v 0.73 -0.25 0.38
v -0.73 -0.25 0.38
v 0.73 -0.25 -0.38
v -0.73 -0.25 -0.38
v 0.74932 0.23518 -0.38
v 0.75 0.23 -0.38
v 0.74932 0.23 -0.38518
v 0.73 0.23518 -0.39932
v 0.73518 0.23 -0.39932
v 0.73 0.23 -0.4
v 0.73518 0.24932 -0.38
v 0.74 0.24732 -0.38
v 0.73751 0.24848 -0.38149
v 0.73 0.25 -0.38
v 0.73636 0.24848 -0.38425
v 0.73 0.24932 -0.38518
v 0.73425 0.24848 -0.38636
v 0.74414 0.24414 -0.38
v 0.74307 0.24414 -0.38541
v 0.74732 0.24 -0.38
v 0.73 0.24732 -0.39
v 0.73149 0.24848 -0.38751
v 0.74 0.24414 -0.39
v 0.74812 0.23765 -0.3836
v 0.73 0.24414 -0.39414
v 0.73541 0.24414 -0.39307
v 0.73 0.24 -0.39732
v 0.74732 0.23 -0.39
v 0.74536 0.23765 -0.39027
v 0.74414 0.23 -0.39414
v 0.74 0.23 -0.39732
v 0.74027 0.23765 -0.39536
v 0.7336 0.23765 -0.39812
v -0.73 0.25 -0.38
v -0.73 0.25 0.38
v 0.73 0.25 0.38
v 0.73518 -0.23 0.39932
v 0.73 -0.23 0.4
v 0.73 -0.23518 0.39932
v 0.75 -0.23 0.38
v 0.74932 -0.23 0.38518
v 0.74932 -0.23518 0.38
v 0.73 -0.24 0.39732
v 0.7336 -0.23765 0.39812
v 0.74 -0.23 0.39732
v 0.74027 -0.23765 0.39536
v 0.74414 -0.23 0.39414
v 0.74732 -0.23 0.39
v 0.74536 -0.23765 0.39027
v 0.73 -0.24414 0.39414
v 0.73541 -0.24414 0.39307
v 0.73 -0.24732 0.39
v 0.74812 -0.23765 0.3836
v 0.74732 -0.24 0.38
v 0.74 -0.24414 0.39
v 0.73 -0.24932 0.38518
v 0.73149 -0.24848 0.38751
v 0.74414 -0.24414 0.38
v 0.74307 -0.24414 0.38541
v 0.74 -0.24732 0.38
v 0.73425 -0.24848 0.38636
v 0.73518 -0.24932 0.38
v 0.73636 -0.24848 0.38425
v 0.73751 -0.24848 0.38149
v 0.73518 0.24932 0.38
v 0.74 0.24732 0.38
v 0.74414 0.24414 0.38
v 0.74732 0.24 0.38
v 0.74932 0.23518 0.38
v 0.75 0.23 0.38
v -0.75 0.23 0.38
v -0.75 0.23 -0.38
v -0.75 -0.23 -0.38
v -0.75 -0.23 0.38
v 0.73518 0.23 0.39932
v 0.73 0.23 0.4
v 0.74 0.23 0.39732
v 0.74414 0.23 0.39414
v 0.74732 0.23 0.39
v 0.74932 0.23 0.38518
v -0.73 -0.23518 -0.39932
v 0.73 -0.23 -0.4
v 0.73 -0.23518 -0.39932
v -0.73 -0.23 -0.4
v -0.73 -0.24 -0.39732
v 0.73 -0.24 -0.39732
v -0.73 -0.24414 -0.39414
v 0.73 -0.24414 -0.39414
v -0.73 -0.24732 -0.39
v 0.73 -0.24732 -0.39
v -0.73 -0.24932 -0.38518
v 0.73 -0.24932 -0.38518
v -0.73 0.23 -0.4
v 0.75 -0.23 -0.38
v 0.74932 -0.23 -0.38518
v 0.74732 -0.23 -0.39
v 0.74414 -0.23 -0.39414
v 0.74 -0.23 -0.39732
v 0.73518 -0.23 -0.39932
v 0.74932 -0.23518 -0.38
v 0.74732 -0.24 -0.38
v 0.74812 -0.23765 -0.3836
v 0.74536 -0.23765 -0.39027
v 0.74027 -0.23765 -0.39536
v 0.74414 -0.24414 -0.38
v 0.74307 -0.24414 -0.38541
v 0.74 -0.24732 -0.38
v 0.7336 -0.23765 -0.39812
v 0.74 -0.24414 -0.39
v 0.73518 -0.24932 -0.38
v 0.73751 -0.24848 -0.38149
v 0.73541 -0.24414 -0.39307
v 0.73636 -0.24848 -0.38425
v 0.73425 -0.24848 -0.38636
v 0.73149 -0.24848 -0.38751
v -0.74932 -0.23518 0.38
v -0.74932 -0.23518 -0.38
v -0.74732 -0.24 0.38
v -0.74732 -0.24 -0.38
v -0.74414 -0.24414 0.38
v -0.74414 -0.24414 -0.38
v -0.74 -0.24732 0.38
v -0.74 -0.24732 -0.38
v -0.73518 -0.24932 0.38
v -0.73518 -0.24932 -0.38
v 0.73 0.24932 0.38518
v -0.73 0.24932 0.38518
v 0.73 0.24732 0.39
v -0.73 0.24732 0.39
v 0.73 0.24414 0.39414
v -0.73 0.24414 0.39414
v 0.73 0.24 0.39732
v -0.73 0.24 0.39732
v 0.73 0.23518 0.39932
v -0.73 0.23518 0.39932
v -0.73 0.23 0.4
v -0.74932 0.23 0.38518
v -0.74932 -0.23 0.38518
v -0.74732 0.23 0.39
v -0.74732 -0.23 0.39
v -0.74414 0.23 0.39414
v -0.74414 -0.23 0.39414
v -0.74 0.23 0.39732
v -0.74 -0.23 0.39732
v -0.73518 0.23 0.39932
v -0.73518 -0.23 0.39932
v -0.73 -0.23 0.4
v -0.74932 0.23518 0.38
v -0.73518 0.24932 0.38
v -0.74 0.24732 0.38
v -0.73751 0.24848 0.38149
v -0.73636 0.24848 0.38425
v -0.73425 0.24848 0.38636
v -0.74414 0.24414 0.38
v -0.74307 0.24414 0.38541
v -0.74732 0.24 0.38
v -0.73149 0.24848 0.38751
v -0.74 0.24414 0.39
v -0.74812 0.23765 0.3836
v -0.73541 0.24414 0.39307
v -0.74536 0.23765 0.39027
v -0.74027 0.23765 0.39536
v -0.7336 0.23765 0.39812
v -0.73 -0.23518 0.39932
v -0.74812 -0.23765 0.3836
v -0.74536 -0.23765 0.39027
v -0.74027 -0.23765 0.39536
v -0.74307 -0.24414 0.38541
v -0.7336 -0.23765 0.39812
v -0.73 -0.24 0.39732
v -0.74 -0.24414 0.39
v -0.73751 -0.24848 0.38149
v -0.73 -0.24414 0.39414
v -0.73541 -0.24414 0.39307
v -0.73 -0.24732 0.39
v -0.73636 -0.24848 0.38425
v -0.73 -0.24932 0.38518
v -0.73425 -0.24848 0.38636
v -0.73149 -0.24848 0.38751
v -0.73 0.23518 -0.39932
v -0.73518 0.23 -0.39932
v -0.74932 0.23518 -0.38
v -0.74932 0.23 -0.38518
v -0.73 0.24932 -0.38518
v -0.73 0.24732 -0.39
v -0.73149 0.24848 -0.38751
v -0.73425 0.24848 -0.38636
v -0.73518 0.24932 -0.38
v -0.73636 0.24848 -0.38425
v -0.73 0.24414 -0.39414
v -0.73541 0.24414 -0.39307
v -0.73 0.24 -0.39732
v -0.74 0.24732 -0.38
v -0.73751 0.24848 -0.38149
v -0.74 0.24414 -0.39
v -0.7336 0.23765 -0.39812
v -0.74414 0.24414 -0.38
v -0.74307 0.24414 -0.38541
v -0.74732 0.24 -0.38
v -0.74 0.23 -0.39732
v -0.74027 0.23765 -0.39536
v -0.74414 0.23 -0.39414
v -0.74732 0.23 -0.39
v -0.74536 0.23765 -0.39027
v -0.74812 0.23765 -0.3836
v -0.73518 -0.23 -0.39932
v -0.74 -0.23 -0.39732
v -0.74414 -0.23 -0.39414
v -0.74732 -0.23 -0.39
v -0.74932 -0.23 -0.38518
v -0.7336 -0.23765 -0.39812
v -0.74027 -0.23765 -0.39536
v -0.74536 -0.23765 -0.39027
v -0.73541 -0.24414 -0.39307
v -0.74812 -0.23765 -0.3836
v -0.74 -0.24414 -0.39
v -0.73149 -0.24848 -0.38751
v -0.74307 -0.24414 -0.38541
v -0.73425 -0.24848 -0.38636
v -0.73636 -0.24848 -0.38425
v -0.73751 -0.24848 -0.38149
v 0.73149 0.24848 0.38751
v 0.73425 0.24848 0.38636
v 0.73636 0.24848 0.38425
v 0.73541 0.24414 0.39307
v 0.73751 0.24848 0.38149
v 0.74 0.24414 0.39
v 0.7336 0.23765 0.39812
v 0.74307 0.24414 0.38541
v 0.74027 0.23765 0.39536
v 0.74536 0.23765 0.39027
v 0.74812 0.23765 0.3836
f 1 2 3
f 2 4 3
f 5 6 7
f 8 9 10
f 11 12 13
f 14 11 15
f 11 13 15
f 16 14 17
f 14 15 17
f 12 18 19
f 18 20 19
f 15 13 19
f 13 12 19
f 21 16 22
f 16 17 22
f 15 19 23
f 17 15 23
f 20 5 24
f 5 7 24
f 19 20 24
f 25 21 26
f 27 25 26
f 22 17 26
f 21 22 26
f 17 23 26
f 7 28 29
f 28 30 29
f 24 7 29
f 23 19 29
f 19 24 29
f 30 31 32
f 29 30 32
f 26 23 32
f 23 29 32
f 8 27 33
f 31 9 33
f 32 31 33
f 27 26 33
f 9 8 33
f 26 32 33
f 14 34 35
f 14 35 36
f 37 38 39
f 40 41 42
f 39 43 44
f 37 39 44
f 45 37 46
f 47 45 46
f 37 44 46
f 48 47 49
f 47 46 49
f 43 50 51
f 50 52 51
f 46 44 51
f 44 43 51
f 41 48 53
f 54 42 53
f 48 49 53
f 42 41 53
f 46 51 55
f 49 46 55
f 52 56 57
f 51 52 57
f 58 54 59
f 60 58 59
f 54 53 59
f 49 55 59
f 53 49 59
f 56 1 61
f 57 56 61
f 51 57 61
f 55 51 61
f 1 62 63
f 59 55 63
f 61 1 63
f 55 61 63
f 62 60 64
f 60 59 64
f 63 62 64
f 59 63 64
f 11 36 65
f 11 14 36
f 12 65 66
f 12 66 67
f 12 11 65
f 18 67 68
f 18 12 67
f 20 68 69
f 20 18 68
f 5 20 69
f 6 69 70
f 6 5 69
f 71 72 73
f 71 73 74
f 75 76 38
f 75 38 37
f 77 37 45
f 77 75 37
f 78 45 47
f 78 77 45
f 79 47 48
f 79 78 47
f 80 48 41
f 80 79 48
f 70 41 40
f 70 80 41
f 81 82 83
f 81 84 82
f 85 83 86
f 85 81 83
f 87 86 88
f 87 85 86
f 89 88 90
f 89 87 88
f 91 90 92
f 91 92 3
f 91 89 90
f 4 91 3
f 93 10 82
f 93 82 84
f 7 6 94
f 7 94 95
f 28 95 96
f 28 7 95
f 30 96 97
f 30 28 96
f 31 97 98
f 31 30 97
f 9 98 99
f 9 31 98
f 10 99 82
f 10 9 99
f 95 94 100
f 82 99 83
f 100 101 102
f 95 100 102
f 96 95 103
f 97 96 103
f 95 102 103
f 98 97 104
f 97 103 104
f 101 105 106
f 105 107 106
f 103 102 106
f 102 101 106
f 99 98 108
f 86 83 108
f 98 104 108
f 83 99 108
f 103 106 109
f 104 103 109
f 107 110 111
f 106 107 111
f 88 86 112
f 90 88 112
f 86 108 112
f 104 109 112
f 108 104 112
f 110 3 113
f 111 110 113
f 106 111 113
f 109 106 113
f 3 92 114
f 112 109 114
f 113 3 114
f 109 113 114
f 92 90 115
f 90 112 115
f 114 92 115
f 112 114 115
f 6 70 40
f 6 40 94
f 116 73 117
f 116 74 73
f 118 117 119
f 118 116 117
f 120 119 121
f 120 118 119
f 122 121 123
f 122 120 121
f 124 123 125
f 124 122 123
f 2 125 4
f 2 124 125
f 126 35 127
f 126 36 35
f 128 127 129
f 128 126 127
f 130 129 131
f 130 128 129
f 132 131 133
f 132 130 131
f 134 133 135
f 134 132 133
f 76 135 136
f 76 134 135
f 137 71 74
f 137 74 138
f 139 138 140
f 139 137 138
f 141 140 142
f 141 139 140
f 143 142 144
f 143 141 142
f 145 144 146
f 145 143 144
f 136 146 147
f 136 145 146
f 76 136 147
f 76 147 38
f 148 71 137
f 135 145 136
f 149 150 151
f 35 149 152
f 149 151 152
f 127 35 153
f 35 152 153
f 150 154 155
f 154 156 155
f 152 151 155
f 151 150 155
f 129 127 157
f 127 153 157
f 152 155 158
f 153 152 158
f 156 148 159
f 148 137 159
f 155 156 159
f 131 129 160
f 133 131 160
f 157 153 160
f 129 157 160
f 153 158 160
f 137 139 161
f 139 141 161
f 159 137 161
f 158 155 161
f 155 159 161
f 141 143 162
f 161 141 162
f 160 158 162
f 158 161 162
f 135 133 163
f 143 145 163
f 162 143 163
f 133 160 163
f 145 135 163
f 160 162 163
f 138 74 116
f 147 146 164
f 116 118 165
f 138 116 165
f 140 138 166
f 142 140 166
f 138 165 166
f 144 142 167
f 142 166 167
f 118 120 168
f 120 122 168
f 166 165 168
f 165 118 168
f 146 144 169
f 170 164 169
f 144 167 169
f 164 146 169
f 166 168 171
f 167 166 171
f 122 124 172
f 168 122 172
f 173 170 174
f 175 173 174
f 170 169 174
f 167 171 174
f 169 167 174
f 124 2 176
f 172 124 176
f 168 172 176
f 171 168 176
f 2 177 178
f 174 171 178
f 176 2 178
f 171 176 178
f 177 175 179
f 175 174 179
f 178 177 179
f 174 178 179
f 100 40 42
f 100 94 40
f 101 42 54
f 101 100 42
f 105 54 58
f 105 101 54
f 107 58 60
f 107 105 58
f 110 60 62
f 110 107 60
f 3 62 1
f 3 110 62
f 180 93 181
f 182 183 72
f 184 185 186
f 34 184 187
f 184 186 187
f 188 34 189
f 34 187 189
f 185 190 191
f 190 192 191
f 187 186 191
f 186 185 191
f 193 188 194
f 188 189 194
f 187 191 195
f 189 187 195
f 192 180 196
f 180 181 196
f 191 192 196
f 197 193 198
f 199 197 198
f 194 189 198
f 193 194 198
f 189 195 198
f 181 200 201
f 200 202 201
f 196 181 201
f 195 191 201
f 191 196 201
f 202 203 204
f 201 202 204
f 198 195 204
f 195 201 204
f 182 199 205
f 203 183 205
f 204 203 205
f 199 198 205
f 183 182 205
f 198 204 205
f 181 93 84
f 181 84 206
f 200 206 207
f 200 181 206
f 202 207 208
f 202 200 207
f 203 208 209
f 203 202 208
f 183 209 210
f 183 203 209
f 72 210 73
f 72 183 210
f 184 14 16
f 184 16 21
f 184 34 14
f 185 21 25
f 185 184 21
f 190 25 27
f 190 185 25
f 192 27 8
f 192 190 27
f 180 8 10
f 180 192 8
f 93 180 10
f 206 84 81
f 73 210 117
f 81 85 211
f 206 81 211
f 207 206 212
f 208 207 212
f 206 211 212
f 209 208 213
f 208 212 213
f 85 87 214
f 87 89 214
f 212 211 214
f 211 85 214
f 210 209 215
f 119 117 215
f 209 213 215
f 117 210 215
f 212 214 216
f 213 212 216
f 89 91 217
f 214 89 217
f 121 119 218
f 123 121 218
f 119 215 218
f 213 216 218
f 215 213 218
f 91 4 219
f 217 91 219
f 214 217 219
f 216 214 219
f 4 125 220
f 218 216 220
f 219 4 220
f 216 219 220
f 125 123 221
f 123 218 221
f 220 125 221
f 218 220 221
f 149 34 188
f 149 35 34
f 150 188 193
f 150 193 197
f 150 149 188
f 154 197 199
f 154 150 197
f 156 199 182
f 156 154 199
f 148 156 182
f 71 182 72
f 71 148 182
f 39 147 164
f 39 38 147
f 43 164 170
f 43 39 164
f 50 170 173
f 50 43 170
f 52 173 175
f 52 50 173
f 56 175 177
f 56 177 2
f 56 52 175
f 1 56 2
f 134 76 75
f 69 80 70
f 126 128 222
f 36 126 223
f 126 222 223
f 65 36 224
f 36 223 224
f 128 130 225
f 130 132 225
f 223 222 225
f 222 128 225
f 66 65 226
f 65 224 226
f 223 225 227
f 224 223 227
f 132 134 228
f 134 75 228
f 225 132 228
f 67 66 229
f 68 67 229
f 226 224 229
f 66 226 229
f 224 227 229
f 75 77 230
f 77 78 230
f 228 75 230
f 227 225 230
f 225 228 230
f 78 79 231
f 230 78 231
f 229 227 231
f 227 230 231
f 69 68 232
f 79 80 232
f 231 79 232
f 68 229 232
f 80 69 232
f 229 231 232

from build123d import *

# Parameters (mm, degrees)
BOSS_EXTRUDE1_DEPTH = 0.25
FILLET2_R           = 0.02


with BuildPart() as part:
    # Sketch1 → Boss-Extrude1 (new body, symmetric)
    with BuildSketch(Plane(origin=(0, 0, 0), x_dir=(1, 0, 0), z_dir=(0, 1, 0))):
        with BuildLine():
            Line((-0.73, -0.4), (0.73, -0.4))
            ThreePointArc((0.73, -0.4), (0.744142136, -0.394142136), (0.75, -0.38))
            Line((0.75, -0.38), (0.75, 0.38))
            ThreePointArc((0.75, 0.38), (0.744142136, 0.394142136), (0.73, 0.4))
            Line((0.73, 0.4), (-0.73, 0.4))
            ThreePointArc((-0.73, 0.4), (-0.744142136, 0.394142136), (-0.75, 0.38))
            Line((-0.75, 0.38), (-0.75, -0.38))
            ThreePointArc((-0.75, -0.38), (-0.744142136, -0.394142136), (-0.73, -0.4))
        make_face()
    extrude(amount=BOSS_EXTRUDE1_DEPTH, both=True)

    # Fillet2
    fillet2_edges = [part.edges().sort_by_distance(p)[0] for p in [
        (0.744142136, 0.25, 0.394142136),
        (0, -0.25, 0.4),
        (-0.744142136, -0.25, 0.394142136),
        (0.75, 0.25, 0),
        (0.744142136, 0.25, -0.394142136),
        (0, 0.25, -0.4),
        (-0.744142136, 0.25, -0.394142136),
        (-0.75, 0.25, 0),
        (-0.744142136, 0.25, 0.394142136),
        (0, 0.25, 0.4),
        (-0.75, -0.25, 0),
        (-0.744142136, -0.25, -0.394142136),
        (0, -0.25, -0.4),
        (0.744142136, -0.25, -0.394142136),
        (0.75, -0.25, 0),
        (0.744142136, -0.25, 0.394142136),
    ]]
    fillet(fillet2_edges, radius=FILLET2_R)


solid = part.part
